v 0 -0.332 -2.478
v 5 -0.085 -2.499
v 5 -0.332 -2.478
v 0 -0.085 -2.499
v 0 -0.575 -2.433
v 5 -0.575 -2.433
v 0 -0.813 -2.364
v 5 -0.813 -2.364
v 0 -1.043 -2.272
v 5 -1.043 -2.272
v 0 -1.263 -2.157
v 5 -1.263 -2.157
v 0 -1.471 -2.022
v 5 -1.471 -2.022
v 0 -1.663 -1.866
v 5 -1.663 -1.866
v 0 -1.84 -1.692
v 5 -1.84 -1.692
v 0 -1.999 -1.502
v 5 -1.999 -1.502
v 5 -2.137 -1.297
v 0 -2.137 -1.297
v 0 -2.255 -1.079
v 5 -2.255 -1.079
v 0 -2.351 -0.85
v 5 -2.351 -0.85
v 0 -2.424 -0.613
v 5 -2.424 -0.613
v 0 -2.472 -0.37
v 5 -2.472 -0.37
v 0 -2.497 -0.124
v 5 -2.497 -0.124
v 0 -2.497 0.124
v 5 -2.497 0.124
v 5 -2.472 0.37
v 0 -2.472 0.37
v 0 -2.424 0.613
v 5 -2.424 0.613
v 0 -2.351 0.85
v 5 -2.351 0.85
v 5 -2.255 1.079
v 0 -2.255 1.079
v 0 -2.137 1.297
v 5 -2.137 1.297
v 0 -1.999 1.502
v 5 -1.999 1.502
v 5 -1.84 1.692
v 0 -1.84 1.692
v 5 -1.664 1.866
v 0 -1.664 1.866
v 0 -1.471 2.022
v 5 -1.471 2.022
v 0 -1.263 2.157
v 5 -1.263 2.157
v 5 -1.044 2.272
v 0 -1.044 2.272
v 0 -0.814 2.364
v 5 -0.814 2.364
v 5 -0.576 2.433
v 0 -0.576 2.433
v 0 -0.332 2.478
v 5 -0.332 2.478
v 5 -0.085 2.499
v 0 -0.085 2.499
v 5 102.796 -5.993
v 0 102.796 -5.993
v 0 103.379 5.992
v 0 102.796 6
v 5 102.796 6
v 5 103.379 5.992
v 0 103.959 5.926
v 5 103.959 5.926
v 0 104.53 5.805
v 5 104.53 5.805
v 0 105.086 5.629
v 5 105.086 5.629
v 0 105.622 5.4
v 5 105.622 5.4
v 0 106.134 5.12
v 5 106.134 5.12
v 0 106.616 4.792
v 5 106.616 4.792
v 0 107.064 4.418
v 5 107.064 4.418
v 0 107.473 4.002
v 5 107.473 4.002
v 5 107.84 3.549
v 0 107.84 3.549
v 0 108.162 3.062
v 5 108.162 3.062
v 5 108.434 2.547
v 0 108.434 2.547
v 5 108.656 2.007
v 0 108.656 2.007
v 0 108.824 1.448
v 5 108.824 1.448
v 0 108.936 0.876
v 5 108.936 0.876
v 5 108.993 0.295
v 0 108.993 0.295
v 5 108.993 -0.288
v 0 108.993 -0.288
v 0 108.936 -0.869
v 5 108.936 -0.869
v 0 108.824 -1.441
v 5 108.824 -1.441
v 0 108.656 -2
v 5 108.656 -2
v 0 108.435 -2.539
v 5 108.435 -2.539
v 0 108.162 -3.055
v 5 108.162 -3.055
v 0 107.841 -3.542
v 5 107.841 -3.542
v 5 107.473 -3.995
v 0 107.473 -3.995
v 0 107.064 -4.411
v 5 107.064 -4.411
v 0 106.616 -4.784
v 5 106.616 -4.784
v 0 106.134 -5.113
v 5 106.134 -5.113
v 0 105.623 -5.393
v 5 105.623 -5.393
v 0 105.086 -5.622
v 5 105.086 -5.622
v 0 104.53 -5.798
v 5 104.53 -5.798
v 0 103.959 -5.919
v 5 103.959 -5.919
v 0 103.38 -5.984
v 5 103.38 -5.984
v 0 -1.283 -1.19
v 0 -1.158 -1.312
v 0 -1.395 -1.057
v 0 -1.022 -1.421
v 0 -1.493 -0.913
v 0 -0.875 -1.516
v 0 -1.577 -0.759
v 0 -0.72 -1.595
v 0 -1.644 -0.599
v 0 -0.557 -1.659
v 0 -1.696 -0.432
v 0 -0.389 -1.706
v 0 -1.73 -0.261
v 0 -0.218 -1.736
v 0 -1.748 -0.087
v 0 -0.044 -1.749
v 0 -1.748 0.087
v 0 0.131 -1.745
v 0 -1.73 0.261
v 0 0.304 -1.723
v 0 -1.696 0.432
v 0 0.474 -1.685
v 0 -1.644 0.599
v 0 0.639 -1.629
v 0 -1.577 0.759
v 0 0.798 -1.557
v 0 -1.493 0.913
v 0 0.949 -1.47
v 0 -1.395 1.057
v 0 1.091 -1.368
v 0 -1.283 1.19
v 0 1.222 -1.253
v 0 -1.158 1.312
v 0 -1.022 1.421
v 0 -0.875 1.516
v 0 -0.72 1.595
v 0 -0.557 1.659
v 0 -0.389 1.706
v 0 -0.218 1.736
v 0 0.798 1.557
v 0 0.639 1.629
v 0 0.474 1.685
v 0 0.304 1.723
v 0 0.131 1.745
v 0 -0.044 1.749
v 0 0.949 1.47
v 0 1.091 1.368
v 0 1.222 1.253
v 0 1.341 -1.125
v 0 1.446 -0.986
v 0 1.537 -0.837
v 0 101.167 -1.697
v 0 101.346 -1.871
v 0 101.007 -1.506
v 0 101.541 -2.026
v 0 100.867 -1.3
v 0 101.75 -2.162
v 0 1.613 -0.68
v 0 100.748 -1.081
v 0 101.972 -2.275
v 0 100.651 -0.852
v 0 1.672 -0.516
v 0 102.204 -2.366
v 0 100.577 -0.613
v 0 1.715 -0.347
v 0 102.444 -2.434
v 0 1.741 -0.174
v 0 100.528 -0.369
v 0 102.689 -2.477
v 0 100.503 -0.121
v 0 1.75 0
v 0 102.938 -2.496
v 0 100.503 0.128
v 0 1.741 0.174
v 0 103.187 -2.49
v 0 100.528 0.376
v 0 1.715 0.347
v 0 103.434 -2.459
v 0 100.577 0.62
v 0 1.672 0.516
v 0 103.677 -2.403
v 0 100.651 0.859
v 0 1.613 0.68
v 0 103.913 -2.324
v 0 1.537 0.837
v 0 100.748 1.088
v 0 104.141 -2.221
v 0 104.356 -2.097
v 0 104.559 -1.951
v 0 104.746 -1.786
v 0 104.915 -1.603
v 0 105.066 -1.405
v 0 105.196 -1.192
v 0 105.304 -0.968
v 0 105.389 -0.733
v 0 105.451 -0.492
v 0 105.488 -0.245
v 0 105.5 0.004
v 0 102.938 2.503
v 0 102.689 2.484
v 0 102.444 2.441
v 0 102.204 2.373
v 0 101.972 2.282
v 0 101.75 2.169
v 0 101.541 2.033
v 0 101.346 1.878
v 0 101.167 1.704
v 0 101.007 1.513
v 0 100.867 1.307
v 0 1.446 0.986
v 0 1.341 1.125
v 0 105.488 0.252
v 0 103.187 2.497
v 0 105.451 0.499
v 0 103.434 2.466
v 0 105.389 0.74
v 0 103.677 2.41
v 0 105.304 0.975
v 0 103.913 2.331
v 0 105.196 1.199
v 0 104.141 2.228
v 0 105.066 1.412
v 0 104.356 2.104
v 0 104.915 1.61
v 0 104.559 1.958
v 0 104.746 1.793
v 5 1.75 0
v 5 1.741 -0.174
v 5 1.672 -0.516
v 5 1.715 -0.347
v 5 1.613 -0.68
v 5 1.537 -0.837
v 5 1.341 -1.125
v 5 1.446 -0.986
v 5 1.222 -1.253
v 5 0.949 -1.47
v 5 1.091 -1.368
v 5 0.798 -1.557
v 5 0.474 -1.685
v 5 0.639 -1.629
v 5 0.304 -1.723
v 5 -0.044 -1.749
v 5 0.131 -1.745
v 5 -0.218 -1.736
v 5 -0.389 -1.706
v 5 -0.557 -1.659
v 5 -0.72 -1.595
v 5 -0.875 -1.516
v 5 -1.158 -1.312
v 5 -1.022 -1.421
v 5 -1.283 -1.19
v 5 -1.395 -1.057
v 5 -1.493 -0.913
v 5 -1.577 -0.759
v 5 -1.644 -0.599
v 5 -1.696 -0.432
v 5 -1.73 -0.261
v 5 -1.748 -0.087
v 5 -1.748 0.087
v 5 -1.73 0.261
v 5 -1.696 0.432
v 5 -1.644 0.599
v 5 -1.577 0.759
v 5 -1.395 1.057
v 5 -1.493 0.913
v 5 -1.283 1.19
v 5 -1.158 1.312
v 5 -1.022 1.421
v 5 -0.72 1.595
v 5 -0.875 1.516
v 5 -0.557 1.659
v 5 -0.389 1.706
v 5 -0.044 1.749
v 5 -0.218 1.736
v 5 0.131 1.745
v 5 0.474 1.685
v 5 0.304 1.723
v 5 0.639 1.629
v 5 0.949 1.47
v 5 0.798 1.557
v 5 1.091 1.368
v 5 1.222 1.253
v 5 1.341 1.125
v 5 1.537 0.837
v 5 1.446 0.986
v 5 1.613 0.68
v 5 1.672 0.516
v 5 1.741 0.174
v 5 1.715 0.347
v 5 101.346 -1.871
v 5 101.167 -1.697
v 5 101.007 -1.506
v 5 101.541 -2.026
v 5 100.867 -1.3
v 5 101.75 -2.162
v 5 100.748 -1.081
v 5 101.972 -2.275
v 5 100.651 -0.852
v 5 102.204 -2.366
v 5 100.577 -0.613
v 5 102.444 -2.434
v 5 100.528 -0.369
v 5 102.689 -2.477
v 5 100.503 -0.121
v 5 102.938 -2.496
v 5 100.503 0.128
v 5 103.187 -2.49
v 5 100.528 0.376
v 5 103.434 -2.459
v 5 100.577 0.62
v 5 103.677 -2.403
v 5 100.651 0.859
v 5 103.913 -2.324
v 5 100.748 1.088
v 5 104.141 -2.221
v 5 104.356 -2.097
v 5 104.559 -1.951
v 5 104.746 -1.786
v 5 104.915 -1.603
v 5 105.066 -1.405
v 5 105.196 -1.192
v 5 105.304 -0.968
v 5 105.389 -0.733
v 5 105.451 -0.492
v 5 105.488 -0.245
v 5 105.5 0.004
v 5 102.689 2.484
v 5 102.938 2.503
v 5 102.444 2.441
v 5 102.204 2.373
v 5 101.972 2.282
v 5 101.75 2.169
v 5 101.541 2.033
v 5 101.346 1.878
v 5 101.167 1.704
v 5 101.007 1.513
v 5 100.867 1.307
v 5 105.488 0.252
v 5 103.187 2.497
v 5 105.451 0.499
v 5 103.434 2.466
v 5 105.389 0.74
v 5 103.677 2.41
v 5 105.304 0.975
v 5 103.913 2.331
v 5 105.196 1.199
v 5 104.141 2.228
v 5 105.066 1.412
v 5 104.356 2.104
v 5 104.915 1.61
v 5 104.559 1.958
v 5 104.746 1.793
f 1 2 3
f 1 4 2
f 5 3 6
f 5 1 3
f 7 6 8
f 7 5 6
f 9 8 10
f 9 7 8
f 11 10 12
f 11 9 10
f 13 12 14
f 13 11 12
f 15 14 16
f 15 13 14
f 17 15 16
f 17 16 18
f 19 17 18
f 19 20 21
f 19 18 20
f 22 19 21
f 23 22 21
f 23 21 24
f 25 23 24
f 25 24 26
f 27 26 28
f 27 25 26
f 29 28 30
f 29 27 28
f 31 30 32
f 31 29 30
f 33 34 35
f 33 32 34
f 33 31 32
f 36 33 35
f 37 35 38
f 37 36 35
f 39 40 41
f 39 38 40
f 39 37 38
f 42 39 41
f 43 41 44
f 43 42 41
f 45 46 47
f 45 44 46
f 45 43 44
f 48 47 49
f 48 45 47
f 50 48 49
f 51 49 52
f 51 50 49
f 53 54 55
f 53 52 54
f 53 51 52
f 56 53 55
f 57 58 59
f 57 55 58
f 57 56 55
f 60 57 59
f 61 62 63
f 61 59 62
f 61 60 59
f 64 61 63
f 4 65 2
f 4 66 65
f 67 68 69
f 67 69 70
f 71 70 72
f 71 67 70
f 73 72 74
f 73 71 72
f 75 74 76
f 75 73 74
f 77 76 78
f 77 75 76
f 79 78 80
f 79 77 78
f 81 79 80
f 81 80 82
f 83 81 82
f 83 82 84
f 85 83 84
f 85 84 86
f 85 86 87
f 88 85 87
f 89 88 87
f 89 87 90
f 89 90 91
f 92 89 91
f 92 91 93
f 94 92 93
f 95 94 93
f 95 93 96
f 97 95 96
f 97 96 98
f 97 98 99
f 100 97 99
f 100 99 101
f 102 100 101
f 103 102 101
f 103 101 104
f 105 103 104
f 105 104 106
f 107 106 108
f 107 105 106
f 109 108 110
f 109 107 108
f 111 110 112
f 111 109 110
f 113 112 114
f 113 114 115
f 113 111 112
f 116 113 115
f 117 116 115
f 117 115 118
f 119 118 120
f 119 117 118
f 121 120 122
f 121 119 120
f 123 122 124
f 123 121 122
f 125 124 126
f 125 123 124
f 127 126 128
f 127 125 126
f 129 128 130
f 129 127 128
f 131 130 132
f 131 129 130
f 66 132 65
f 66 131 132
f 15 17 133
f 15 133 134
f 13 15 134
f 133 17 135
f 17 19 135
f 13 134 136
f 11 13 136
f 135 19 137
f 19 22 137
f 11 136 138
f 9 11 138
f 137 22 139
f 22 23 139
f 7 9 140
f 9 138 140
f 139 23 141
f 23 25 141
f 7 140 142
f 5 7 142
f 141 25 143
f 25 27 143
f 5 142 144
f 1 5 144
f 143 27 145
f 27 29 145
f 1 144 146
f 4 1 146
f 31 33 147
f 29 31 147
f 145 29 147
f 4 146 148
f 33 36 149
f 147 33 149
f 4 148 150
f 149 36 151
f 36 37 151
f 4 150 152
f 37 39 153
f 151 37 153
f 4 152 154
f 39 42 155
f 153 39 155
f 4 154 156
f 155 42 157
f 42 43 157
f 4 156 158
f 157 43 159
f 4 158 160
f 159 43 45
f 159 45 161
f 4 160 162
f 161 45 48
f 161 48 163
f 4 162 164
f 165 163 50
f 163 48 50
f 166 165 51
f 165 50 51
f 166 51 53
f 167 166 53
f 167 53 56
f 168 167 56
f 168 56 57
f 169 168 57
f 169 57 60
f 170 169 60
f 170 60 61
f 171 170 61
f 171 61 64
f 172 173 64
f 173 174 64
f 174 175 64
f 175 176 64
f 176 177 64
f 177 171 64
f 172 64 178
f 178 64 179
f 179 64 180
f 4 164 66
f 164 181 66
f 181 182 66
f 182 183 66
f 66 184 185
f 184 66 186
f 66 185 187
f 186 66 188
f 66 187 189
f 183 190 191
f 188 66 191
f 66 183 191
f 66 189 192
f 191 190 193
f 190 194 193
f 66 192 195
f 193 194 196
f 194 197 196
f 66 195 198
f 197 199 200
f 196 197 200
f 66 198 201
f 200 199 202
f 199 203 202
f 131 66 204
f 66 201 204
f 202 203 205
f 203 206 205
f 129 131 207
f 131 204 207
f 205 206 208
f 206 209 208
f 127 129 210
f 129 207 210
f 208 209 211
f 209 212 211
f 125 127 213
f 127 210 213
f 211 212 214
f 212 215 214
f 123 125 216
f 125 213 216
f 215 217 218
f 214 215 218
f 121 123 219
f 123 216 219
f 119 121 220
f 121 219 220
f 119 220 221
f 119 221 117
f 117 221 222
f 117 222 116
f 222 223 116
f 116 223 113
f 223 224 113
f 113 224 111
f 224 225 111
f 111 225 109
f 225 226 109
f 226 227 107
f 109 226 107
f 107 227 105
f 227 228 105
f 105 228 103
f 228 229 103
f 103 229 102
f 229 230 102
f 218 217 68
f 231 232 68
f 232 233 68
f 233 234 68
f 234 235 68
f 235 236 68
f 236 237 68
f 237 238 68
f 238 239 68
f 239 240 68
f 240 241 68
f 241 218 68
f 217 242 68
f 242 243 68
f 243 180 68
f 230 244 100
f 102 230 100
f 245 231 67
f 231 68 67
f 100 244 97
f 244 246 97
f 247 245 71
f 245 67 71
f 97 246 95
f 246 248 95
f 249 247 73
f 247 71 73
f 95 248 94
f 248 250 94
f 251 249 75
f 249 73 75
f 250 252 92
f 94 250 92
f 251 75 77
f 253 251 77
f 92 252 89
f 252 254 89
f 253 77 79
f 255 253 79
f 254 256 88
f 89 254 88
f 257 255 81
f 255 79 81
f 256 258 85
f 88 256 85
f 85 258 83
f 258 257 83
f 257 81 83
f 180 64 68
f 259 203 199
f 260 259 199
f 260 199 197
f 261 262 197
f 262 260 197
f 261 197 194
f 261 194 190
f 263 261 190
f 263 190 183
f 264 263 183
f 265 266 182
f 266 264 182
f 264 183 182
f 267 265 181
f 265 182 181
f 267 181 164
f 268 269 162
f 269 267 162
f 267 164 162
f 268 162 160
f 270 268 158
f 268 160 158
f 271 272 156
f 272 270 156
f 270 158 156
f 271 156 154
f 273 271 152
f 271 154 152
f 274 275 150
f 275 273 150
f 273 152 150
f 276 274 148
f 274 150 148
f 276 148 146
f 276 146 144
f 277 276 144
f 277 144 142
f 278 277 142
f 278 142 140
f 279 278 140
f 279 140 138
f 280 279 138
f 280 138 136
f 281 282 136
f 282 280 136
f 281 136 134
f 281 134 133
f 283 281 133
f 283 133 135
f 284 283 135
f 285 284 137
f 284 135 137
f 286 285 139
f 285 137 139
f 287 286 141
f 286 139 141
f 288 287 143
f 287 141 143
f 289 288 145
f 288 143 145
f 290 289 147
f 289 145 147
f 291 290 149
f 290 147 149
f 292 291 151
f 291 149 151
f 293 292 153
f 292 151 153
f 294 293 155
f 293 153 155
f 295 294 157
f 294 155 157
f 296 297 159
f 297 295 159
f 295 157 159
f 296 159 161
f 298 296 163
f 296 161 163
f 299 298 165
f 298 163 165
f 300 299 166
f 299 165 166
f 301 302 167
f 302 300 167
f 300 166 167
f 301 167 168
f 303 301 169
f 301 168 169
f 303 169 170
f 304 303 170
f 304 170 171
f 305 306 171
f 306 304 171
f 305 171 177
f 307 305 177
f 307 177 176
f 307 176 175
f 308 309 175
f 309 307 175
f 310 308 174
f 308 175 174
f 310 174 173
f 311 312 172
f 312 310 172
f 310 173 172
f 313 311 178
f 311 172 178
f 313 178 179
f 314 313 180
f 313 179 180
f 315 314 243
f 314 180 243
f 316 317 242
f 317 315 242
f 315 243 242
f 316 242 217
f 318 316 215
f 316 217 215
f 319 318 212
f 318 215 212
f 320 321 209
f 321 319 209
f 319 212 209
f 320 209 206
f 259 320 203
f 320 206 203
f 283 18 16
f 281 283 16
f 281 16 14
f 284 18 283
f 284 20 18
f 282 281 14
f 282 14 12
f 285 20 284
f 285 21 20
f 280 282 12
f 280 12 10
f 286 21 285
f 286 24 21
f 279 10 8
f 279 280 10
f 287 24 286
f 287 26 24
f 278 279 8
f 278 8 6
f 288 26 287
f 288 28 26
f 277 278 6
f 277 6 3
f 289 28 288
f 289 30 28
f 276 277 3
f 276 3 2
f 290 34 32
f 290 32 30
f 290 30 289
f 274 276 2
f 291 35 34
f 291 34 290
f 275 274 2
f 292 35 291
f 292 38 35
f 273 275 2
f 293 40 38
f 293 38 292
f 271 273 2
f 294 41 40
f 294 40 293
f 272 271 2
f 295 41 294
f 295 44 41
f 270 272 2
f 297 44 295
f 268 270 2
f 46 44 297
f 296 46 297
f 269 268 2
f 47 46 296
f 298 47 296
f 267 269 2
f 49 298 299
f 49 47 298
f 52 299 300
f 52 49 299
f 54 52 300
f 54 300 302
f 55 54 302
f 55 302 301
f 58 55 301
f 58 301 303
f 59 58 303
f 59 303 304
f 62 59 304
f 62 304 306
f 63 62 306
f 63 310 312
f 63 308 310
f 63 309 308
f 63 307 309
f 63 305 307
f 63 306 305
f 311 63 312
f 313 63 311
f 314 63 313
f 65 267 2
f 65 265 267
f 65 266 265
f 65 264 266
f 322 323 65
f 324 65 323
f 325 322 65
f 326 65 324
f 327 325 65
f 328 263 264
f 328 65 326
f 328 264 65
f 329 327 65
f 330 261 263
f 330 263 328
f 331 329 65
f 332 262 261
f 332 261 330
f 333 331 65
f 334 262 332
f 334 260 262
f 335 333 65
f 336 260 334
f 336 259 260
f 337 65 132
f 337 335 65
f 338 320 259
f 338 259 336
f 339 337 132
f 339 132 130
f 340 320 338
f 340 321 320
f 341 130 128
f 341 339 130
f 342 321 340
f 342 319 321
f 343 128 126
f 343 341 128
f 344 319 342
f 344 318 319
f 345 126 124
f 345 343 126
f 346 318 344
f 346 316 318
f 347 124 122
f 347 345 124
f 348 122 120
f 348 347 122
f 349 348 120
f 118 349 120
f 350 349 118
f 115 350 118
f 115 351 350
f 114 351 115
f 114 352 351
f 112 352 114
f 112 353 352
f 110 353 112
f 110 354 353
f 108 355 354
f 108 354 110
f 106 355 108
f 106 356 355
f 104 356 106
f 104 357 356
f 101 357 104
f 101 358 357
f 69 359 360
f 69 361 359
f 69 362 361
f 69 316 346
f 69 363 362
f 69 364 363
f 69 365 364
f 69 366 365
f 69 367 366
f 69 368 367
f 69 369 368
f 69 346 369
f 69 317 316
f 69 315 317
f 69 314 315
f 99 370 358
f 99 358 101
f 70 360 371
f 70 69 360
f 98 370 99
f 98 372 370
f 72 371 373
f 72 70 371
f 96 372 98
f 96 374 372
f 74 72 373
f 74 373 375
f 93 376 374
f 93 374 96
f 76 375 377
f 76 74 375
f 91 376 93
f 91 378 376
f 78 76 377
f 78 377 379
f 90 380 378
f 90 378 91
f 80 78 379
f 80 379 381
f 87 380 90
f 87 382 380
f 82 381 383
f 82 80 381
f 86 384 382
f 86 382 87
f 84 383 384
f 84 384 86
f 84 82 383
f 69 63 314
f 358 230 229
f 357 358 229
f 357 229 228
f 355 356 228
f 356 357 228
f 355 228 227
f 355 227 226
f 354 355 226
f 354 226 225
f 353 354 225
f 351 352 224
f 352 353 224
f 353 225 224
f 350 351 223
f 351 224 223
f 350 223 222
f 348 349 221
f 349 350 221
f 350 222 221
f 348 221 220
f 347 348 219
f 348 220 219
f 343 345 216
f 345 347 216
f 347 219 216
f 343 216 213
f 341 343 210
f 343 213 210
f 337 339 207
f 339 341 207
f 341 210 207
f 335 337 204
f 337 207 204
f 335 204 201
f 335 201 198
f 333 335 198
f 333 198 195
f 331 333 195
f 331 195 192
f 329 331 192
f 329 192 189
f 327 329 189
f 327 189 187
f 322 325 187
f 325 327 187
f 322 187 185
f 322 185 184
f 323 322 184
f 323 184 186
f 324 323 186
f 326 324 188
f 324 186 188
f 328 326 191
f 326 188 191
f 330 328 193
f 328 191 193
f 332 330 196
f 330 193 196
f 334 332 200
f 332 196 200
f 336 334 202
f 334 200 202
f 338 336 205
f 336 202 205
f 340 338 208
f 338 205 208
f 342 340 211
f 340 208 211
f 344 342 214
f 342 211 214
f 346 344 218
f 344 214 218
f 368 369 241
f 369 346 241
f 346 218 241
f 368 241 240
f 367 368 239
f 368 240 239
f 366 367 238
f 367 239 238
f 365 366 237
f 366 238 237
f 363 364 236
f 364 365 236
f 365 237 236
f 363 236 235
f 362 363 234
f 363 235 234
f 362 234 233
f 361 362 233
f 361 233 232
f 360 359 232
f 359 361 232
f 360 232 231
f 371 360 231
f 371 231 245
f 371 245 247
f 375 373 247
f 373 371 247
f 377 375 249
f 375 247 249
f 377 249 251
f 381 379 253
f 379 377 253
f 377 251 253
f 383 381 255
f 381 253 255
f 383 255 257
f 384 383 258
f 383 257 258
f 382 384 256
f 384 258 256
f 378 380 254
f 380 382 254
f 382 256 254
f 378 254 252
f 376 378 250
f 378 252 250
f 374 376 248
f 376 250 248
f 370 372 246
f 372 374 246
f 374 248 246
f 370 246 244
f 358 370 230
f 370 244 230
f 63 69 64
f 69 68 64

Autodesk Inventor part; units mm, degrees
ref_plane "YZ Plane" through (0, 0, 0) normal (1, 0, 0) x (0, 1, 0)
ref_plane "XZ Plane" through (0, 0, 0) normal (0, 1, 0) x (-1, 0, 0)
ref_plane "XY Plane" through (0, 0, 0) normal (0, 0, 1) x (1, 0, 0)
sketch "Sketch1" plane through (0, 0, 0) normal (1, 0, 0) x (0, 1, 0)
  circle A0 centre (0, 0) radius 1.75
  circle A1 centre (103.0001, 0.0035) radius 2.5
  circle A2 centre (103.0001, 0.0035) radius 6
  circle A3 centre (0, 0) radius 2.5
  line L0 (102.7964, -5.9931) -> (-0.0849, -2.4986)
  line L1 (102.796, 6) -> (-0.085, 2.4986)
  dimension "d0" = 3.5
  dimension "d1" = 5
  dimension "d2" = 12
  dimension "d3" = 5
extrude "Extrusion1" add sketch "Sketch1" along normal blind 5
properties part number "CoinLockUdløser"
